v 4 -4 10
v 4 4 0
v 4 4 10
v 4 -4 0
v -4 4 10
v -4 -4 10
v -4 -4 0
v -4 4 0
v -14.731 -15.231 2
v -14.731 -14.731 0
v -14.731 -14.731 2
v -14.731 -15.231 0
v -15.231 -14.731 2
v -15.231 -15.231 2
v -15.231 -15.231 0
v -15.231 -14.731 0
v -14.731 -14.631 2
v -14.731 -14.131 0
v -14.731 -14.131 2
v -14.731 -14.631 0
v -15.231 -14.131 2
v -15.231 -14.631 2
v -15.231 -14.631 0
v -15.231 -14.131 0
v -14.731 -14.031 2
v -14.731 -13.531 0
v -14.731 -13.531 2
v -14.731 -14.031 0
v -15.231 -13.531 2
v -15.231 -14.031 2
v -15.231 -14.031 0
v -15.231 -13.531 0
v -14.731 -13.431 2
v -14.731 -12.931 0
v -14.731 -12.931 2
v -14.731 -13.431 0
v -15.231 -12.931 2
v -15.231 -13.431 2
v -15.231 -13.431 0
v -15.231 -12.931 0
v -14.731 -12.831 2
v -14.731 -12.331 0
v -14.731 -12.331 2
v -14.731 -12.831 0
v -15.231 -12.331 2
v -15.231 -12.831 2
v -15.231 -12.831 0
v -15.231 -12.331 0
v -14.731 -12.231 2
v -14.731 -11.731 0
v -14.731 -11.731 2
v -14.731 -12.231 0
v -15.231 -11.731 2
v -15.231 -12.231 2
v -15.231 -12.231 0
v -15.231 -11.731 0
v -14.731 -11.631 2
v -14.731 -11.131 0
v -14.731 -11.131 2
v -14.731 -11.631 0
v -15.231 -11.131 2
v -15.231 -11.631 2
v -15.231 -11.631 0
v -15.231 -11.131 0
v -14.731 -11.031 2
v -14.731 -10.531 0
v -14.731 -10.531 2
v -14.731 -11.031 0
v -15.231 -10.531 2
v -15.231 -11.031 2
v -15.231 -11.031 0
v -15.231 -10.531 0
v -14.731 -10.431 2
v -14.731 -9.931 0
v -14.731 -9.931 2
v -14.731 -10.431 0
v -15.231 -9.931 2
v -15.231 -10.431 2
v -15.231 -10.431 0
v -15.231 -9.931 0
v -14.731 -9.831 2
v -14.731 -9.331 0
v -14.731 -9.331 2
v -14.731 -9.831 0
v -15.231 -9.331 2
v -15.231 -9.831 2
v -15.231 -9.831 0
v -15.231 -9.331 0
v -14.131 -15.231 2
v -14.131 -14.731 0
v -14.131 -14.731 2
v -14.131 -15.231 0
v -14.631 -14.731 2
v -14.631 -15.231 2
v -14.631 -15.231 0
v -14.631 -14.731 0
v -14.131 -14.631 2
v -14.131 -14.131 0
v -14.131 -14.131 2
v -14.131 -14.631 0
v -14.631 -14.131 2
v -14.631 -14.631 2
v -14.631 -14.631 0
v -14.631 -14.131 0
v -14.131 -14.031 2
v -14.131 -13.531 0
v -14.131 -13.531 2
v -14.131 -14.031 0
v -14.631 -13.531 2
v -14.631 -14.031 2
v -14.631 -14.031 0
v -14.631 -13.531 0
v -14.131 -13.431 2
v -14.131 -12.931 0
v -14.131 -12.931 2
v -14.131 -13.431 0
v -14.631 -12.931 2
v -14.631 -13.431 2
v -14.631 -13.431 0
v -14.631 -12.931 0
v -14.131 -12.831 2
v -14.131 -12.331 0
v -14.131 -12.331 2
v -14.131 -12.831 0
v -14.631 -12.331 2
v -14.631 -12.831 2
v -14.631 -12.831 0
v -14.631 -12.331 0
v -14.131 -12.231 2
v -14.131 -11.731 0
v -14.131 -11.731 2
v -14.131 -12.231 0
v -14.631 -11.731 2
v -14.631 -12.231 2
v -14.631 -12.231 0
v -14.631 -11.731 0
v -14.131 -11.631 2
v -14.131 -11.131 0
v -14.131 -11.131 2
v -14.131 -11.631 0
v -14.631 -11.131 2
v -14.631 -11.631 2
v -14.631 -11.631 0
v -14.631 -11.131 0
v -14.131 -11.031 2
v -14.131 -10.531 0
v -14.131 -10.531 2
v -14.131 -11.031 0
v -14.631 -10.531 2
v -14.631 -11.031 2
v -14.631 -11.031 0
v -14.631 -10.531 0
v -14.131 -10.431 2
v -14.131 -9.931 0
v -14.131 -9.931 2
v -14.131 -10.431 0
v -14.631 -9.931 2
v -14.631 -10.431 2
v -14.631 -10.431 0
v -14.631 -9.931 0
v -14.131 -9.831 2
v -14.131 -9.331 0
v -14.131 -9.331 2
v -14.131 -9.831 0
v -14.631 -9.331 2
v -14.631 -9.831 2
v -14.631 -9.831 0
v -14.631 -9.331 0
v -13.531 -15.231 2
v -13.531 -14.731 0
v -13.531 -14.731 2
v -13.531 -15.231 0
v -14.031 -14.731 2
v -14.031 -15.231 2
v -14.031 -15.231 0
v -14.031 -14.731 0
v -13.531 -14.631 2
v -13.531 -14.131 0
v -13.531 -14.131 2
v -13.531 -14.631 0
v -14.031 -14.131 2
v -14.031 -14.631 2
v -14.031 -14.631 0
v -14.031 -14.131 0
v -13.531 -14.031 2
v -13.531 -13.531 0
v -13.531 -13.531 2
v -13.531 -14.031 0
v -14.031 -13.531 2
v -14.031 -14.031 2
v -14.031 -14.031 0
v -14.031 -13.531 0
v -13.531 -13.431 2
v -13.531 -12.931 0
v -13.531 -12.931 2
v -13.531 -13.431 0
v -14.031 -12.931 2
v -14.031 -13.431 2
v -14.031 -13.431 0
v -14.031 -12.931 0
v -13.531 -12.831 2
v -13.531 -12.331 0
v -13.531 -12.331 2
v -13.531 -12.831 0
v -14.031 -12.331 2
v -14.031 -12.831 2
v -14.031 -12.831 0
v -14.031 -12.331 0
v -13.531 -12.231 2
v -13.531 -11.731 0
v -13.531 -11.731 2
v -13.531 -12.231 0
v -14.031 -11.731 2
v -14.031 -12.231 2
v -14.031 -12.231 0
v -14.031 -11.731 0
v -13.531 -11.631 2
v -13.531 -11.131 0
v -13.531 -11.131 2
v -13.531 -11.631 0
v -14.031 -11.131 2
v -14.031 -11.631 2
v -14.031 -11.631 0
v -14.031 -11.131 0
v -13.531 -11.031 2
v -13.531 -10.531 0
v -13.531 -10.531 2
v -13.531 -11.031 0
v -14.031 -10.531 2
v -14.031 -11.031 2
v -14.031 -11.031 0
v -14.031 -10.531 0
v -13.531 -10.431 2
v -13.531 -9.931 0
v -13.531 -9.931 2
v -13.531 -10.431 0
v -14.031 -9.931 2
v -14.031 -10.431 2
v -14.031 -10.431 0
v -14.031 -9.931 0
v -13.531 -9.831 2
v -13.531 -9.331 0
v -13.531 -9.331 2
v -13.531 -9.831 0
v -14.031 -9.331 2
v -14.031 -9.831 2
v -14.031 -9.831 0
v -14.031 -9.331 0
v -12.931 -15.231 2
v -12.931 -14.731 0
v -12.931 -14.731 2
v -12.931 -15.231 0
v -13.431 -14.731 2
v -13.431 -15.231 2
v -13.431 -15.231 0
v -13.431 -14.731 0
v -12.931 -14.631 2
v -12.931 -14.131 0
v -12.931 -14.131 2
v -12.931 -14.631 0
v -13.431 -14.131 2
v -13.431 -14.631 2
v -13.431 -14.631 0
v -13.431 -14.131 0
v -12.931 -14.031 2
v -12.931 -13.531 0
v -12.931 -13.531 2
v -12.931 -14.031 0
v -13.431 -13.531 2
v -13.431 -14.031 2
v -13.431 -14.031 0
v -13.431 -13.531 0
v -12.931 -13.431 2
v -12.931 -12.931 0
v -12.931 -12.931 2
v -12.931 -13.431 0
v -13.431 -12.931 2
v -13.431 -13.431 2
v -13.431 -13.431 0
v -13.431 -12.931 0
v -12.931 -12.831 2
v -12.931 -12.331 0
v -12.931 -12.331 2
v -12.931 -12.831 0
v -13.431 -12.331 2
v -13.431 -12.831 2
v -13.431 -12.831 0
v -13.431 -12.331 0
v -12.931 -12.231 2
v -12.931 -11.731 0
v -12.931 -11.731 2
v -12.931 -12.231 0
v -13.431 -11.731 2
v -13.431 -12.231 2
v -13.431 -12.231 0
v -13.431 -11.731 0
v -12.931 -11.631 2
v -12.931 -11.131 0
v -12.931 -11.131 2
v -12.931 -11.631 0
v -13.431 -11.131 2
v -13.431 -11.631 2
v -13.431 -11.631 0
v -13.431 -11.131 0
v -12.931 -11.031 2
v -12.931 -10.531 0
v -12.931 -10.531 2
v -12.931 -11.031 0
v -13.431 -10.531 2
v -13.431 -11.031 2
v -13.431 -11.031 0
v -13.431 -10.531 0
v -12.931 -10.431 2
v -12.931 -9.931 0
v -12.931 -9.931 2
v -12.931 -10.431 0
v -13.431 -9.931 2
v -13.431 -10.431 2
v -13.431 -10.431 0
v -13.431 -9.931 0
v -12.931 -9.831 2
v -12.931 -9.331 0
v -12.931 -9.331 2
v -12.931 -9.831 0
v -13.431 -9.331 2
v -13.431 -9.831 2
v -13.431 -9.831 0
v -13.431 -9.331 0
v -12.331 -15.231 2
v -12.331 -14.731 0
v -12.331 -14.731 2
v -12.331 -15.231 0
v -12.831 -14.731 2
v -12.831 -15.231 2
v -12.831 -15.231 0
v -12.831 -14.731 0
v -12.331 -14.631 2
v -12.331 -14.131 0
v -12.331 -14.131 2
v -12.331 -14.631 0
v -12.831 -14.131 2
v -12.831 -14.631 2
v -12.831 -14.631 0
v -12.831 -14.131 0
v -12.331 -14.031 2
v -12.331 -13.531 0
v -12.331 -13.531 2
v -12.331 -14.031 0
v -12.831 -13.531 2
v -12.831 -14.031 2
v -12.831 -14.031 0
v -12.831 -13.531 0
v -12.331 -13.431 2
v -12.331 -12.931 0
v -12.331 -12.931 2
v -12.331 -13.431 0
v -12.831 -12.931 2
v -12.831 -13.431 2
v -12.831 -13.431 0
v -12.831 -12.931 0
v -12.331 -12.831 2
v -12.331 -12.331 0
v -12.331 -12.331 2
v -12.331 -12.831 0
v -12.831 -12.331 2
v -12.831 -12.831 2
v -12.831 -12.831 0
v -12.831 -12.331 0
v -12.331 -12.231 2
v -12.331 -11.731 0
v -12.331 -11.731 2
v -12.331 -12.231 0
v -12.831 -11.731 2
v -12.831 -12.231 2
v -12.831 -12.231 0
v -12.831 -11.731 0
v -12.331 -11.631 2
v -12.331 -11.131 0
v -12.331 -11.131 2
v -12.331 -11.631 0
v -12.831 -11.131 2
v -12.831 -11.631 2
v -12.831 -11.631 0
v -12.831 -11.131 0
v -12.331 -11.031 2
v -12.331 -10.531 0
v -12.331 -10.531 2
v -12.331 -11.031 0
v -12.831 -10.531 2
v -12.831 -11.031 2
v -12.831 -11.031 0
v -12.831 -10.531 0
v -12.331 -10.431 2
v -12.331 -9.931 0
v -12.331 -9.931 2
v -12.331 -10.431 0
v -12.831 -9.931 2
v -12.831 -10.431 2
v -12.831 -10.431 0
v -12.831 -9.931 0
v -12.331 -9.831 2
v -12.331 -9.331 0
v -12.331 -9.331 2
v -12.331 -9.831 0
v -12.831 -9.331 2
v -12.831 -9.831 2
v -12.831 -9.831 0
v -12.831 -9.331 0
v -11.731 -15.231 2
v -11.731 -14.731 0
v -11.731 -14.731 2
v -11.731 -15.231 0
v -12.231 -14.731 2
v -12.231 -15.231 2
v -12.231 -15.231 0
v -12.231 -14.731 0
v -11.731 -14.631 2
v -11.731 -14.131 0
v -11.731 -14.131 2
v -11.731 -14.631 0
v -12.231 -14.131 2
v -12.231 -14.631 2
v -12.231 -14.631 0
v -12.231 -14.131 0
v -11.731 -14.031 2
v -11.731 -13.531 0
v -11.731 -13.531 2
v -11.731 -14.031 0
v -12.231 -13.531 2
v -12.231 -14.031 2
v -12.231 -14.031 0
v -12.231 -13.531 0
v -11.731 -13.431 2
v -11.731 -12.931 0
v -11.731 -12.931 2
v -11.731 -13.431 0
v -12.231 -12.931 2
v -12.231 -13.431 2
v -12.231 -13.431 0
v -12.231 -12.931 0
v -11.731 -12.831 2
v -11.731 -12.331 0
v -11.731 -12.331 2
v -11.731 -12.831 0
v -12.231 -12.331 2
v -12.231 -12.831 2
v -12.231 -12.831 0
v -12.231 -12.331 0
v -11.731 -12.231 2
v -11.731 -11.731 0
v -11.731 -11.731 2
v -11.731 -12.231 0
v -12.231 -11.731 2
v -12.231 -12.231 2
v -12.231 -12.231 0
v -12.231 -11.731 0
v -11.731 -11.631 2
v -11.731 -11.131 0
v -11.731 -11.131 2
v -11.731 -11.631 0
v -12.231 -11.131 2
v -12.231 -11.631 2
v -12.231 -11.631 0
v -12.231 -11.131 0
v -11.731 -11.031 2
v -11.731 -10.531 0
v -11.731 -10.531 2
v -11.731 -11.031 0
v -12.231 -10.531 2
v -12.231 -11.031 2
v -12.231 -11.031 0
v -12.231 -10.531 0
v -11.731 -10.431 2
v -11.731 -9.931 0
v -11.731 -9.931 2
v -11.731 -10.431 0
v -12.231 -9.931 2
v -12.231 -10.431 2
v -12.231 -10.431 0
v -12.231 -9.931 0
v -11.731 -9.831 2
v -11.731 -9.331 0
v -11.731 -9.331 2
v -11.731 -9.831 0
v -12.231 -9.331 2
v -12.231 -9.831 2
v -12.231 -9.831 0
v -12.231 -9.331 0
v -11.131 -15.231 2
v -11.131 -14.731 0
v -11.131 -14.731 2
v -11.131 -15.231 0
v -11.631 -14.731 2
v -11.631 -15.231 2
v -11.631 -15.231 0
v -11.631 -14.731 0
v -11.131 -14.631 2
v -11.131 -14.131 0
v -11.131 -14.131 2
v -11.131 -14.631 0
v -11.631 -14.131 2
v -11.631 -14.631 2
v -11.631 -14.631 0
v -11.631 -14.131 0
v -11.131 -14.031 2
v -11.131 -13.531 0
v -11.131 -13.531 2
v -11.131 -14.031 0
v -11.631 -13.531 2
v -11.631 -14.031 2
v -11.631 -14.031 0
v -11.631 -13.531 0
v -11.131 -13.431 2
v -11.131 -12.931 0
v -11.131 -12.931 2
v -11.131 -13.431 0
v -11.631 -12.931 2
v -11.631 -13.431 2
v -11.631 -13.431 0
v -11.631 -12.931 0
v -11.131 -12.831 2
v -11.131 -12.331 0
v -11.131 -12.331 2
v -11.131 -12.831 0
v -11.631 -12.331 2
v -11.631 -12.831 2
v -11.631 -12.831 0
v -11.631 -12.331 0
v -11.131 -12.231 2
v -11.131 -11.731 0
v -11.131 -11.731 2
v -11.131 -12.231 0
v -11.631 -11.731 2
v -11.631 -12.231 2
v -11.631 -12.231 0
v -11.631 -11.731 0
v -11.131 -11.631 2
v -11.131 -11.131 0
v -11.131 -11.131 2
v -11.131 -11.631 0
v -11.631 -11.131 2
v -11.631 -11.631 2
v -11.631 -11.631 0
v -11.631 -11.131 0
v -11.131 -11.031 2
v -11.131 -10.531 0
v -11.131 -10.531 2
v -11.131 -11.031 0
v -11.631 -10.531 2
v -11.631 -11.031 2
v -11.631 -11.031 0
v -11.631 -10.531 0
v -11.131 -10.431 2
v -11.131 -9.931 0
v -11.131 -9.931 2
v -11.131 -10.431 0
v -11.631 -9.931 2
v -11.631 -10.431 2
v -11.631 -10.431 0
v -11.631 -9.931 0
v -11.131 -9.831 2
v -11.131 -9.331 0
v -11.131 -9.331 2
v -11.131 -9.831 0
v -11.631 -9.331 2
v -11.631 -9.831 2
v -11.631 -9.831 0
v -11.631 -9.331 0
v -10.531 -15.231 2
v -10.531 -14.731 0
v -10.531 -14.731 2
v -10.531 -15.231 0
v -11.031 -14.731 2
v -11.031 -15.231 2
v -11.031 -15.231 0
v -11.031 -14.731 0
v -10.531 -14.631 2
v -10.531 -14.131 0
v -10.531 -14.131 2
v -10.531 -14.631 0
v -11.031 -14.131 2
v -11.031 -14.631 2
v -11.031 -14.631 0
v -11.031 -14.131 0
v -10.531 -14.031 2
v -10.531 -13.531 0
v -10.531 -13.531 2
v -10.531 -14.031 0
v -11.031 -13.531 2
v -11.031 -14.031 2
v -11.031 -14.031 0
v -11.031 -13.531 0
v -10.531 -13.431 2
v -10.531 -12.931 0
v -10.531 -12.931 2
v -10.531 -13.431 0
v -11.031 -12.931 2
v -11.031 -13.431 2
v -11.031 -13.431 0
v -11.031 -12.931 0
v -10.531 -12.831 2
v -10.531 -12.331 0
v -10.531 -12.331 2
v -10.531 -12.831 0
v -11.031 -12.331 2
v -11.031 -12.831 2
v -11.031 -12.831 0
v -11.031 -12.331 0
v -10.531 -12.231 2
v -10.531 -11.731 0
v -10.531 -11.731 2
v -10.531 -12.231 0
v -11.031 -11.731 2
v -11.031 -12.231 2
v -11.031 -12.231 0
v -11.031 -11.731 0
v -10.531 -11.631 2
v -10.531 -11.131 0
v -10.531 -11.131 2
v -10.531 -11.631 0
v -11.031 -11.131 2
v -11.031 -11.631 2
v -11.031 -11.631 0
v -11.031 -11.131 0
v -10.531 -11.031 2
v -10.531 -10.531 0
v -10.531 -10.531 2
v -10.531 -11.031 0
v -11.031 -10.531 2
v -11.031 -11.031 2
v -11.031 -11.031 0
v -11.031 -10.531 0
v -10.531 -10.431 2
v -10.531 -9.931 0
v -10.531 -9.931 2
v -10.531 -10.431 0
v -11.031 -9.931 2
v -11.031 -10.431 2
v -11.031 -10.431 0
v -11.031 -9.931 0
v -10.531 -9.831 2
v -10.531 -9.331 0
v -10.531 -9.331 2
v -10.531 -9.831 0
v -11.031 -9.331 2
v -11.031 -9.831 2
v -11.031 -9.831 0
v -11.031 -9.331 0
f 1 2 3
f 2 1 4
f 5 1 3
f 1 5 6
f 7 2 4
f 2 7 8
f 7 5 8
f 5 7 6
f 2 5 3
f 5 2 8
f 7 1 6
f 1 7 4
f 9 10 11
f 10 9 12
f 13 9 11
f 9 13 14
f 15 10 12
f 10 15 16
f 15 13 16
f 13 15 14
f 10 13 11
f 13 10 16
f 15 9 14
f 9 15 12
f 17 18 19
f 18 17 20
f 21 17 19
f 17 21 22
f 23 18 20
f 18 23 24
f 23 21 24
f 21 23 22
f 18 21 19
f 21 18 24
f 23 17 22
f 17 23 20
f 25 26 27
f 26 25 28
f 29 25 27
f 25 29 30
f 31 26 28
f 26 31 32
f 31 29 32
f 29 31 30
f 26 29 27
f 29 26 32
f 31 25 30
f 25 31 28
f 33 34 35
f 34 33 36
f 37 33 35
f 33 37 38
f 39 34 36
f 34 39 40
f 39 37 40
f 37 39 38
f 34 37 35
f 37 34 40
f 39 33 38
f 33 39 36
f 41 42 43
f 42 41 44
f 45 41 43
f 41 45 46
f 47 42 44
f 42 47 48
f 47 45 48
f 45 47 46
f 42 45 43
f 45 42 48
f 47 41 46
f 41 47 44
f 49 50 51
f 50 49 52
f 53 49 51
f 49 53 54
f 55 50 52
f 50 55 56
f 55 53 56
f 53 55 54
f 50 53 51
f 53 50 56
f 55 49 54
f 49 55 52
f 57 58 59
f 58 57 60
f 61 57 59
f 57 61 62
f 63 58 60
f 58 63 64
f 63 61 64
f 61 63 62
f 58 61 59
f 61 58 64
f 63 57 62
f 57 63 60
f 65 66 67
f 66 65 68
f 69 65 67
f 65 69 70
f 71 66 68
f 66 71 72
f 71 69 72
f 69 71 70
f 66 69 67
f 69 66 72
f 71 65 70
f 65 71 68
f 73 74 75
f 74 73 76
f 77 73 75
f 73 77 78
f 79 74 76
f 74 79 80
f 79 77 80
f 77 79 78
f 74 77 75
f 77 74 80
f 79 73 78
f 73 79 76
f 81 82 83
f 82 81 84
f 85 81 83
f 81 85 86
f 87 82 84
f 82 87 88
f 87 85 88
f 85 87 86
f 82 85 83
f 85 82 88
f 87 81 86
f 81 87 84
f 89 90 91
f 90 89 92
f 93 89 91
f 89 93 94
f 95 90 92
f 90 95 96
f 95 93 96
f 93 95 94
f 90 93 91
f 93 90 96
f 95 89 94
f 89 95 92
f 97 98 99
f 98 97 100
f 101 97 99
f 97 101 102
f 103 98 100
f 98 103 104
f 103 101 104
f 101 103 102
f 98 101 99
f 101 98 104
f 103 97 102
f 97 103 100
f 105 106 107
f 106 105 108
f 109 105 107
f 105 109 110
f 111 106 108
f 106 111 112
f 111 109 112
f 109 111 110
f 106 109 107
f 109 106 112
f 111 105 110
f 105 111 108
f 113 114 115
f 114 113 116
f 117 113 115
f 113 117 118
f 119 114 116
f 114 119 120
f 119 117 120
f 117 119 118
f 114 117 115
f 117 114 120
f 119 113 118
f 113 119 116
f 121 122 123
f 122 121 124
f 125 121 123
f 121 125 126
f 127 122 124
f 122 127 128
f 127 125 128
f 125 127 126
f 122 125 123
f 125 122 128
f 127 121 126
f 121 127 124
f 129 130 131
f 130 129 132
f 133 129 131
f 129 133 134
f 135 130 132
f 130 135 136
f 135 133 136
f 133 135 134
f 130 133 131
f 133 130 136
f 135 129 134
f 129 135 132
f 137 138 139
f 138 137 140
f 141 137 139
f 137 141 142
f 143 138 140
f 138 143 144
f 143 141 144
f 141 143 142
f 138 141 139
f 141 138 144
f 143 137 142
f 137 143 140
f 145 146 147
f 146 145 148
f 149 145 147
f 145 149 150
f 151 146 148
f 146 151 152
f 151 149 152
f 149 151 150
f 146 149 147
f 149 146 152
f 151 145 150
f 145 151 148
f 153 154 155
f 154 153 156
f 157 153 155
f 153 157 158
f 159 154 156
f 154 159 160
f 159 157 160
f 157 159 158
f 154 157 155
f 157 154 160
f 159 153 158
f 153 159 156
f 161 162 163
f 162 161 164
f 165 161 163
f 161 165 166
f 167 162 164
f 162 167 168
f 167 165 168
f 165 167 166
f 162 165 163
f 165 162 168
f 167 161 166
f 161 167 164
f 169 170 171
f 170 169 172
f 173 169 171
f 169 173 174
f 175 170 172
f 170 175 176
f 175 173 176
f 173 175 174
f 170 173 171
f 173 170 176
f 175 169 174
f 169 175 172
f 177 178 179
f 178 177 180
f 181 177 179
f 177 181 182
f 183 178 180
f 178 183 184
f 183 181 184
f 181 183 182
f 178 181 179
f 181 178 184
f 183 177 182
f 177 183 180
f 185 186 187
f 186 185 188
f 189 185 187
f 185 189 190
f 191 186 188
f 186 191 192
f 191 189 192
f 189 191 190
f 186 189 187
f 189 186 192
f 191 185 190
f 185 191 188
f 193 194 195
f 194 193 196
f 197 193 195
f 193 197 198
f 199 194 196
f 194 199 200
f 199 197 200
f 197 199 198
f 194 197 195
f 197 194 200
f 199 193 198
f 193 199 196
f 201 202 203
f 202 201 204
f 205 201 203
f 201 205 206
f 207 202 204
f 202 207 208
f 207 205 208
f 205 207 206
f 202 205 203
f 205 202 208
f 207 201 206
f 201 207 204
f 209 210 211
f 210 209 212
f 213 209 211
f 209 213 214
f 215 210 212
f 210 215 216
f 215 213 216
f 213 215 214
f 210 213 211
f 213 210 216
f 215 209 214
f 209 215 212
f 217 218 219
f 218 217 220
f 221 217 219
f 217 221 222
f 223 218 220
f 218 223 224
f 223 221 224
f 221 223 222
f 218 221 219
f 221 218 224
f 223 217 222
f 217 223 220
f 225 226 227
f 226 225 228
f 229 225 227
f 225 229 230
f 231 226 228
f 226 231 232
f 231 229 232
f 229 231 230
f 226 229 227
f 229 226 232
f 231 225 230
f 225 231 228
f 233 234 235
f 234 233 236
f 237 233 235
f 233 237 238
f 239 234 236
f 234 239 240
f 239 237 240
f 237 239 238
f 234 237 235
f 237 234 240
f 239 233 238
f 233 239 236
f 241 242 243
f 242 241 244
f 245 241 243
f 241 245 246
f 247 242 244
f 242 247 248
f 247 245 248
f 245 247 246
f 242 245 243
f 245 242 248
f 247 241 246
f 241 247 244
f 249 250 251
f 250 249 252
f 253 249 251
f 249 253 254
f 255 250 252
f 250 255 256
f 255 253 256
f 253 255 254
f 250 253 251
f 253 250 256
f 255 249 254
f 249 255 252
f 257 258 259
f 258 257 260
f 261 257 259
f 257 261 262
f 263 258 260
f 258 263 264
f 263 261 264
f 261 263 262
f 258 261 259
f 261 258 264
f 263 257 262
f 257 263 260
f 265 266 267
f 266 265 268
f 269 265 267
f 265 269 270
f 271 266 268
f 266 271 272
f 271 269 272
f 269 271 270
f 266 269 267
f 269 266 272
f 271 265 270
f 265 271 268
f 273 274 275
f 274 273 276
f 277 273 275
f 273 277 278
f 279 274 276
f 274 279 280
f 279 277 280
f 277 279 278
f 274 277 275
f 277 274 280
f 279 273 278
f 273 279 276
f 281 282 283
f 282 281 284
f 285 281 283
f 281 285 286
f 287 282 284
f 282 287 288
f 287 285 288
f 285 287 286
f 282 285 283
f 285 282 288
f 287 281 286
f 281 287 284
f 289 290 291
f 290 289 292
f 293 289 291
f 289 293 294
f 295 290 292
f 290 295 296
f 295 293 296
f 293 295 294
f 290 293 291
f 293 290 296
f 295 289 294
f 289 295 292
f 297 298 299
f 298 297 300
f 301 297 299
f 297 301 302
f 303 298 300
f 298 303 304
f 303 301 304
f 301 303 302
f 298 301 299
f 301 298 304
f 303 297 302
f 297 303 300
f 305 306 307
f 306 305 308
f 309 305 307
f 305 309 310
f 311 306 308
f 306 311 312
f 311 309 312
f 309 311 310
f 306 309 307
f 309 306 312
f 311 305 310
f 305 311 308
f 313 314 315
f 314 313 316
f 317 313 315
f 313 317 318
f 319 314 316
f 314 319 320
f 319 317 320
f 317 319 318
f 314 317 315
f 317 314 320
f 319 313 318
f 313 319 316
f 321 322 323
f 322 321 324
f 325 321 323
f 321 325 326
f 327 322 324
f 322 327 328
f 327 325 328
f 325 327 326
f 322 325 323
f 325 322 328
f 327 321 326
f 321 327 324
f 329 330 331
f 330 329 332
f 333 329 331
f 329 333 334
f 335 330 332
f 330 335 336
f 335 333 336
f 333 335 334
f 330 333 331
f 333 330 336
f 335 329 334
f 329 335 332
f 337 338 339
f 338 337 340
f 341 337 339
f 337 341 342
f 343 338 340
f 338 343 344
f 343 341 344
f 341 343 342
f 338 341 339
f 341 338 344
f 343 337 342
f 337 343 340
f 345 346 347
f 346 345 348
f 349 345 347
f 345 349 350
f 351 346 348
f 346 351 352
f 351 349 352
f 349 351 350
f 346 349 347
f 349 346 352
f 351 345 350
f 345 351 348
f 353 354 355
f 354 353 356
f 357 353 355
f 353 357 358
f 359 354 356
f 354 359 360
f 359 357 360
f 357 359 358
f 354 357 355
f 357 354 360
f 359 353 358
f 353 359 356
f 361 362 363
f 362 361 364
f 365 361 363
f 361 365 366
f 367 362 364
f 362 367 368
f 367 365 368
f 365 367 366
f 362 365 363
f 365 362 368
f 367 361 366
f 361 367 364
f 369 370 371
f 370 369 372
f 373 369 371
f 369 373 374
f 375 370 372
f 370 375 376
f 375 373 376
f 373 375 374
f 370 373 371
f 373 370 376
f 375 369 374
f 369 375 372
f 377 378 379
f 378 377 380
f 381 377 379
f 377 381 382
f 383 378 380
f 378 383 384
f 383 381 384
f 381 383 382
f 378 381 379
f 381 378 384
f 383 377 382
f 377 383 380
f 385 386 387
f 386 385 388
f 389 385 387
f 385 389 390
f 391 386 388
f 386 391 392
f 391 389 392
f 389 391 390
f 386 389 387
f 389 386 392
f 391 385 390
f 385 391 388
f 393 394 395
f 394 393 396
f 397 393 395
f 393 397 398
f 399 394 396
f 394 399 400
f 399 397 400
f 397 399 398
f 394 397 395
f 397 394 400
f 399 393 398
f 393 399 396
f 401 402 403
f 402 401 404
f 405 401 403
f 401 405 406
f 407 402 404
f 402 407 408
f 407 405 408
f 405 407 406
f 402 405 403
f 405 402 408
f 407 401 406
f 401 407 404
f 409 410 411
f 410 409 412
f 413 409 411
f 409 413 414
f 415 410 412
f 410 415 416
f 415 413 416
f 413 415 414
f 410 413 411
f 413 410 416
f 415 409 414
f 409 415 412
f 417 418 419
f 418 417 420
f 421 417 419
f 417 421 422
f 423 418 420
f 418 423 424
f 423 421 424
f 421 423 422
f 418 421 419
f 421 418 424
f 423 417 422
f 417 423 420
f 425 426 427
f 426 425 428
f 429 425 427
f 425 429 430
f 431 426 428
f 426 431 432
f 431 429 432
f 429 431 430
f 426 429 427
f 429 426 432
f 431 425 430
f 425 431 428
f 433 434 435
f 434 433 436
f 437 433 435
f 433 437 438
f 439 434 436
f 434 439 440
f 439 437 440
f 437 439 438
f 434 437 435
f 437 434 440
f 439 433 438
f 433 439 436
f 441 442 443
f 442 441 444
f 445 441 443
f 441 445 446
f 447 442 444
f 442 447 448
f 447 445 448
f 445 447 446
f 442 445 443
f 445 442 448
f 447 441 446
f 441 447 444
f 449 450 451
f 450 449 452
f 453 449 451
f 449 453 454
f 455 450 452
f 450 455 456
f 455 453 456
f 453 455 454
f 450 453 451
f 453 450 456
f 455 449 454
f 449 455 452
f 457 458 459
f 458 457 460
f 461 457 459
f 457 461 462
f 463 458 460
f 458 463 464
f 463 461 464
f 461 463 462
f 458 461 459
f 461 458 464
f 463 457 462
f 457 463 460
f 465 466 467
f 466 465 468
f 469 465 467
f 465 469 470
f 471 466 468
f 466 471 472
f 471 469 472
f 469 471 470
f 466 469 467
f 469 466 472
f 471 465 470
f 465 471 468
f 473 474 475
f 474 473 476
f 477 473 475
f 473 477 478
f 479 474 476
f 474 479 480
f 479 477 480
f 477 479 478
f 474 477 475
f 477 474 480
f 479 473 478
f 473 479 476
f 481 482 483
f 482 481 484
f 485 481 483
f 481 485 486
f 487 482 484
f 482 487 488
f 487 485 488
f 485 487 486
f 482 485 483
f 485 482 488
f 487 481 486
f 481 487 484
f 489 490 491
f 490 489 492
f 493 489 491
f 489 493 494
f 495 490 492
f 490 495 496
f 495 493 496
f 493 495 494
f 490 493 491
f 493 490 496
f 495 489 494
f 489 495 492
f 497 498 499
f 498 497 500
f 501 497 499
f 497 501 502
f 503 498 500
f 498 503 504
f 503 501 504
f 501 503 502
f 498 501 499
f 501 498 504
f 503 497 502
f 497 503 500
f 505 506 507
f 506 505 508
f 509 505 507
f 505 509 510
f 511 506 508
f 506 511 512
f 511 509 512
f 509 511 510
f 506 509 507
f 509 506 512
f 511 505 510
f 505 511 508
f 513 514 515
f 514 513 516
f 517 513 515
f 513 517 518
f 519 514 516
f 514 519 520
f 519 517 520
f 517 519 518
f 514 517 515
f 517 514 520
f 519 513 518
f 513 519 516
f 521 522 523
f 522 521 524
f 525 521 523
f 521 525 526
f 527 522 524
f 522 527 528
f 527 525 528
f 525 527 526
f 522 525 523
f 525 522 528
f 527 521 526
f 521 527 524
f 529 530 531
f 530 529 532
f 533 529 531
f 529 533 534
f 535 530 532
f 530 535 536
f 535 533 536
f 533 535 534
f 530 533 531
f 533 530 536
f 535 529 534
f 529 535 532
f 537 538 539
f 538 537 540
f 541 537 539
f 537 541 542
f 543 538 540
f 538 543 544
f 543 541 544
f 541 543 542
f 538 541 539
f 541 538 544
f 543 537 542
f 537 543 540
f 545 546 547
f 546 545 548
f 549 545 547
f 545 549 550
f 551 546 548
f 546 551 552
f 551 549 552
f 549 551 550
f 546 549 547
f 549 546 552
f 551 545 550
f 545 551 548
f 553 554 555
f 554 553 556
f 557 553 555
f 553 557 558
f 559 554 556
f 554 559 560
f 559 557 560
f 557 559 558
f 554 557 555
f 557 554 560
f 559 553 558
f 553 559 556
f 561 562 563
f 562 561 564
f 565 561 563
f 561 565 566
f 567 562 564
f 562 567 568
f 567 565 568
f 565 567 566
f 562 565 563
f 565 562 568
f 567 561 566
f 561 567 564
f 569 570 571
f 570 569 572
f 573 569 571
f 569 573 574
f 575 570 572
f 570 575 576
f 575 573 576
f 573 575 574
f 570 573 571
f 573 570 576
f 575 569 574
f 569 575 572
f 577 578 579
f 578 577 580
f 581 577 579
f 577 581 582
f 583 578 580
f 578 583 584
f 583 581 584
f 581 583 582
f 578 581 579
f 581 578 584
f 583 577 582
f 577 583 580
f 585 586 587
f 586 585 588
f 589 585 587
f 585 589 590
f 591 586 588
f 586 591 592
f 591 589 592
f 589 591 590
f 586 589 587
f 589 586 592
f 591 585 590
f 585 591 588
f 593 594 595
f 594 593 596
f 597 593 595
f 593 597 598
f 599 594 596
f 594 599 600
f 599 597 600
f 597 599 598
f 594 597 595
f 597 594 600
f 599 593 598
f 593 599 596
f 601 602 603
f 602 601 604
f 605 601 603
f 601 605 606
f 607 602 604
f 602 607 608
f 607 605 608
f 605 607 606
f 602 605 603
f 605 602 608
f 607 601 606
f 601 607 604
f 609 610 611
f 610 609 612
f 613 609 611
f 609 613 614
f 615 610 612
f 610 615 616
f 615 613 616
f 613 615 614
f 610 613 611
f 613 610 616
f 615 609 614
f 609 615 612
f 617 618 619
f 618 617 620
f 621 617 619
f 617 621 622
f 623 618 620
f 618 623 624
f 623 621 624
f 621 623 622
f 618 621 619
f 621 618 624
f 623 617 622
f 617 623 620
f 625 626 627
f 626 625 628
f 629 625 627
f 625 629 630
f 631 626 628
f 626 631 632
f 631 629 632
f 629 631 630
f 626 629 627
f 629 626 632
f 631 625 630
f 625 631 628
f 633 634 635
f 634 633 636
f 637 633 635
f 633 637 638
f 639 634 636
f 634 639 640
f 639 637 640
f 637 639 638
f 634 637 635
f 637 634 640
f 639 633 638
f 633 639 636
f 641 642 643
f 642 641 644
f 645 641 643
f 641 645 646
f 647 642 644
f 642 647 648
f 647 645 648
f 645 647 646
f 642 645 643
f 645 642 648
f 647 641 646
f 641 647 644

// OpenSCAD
translate([0, 0, 5]) color([0,1,0,0.9]) cube([8, 8, 10], center=true);
translate([-14.98142396999972, -14.98142396999972, 1]) color([1,0,0]) cube([0.5, 0.5, 2], center=true);
translate([-14.98142396999972, -14.38142396999972, 1]) color([1,0,0]) cube([0.5, 0.5, 2], center=true);
translate([-14.98142396999972, -13.78142396999972, 1]) color([1,0,0]) cube([0.5, 0.5, 2], center=true);
translate([-14.98142396999972, -13.18142396999972, 1]) color([1,0,0]) cube([0.5, 0.5, 2], center=true);
translate([-14.98142396999972, -12.581423969999719, 1]) color([1,0,0]) cube([0.5, 0.5, 2], center=true);
translate([-14.98142396999972, -11.98142396999972, 1]) color([1,0,0]) cube([0.5, 0.5, 2], center=true);
translate([-14.98142396999972, -11.38142396999972, 1]) color([1,0,0]) cube([0.5, 0.5, 2], center=true);
translate([-14.98142396999972, -10.781423969999718, 1]) color([1,0,0]) cube([0.5, 0.5, 2], center=true);
translate([-14.98142396999972, -10.181423969999718, 1]) color([1,0,0]) cube([0.5, 0.5, 2], center=true);
translate([-14.98142396999972, -9.581423969999719, 1]) color([1,0,0]) cube([0.5, 0.5, 2], center=true);
translate([-14.38142396999972, -14.98142396999972, 1]) color([1,0,0]) cube([0.5, 0.5, 2], center=true);
translate([-14.38142396999972, -14.38142396999972, 1]) color([1,0,0]) cube([0.5, 0.5, 2], center=true);
translate([-14.38142396999972, -13.78142396999972, 1]) color([1,0,0]) cube([0.5, 0.5, 2], center=true);
translate([-14.38142396999972, -13.18142396999972, 1]) color([1,0,0]) cube([0.5, 0.5, 2], center=true);
translate([-14.38142396999972, -12.581423969999719, 1]) color([1,0,0]) cube([0.5, 0.5, 2], center=true);
translate([-14.38142396999972, -11.98142396999972, 1]) color([1,0,0]) cube([0.5, 0.5, 2], center=true);
translate([-14.38142396999972, -11.38142396999972, 1]) color([1,0,0]) cube([0.5, 0.5, 2], center=true);
translate([-14.38142396999972, -10.781423969999718, 1]) color([1,0,0]) cube([0.5, 0.5, 2], center=true);
translate([-14.38142396999972, -10.181423969999718, 1]) color([1,0,0]) cube([0.5, 0.5, 2], center=true);
translate([-14.38142396999972, -9.581423969999719, 1]) color([1,0,0]) cube([0.5, 0.5, 2], center=true);
translate([-13.78142396999972, -14.98142396999972, 1]) color([1,0,0]) cube([0.5, 0.5, 2], center=true);
translate([-13.78142396999972, -14.38142396999972, 1]) color([1,0,0]) cube([0.5, 0.5, 2], center=true);
translate([-13.78142396999972, -13.78142396999972, 1]) color([1,0,0]) cube([0.5, 0.5, 2], center=true);
translate([-13.78142396999972, -13.18142396999972, 1]) color([1,0,0]) cube([0.5, 0.5, 2], center=true);
translate([-13.78142396999972, -12.581423969999719, 1]) color([1,0,0]) cube([0.5, 0.5, 2], center=true);
translate([-13.78142396999972, -11.98142396999972, 1]) color([1,0,0]) cube([0.5, 0.5, 2], center=true);
translate([-13.78142396999972, -11.38142396999972, 1]) color([1,0,0]) cube([0.5, 0.5, 2], center=true);
translate([-13.78142396999972, -10.781423969999718, 1]) color([1,0,0]) cube([0.5, 0.5, 2], center=true);
translate([-13.78142396999972, -10.181423969999718, 1]) color([1,0,0]) cube([0.5, 0.5, 2], center=true);
translate([-13.78142396999972, -9.581423969999719, 1]) color([1,0,0]) cube([0.5, 0.5, 2], center=true);
translate([-13.18142396999972, -14.98142396999972, 1]) color([1,0,0]) cube([0.5, 0.5, 2], center=true);
translate([-13.18142396999972, -14.38142396999972, 1]) color([1,0,0]) cube([0.5, 0.5, 2], center=true);
translate([-13.18142396999972, -13.78142396999972, 1]) color([1,0,0]) cube([0.5, 0.5, 2], center=true);
translate([-13.18142396999972, -13.18142396999972, 1]) color([1,0,0]) cube([0.5, 0.5, 2], center=true);
translate([-13.18142396999972, -12.581423969999719, 1]) color([1,0,0]) cube([0.5, 0.5, 2], center=true);
translate([-13.18142396999972, -11.98142396999972, 1]) color([1,0,0]) cube([0.5, 0.5, 2], center=true);
translate([-13.18142396999972, -11.38142396999972, 1]) color([1,0,0]) cube([0.5, 0.5, 2], center=true);
translate([-13.18142396999972, -10.781423969999718, 1]) color([1,0,0]) cube([0.5, 0.5, 2], center=true);
translate([-13.18142396999972, -10.181423969999718, 1]) color([1,0,0]) cube([0.5, 0.5, 2], center=true);
translate([-13.18142396999972, -9.581423969999719, 1]) color([1,0,0]) cube([0.5, 0.5, 2], center=true);
translate([-12.581423969999719, -14.98142396999972, 1]) color([1,0,0]) cube([0.5, 0.5, 2], center=true);
translate([-12.581423969999719, -14.38142396999972, 1]) color([1,0,0]) cube([0.5, 0.5, 2], center=true);
translate([-12.581423969999719, -13.78142396999972, 1]) color([1,0,0]) cube([0.5, 0.5, 2], center=true);
translate([-12.581423969999719, -13.18142396999972, 1]) color([1,0,0]) cube([0.5, 0.5, 2], center=true);
translate([-12.581423969999719, -12.581423969999719, 1]) color([1,0,0]) cube([0.5, 0.5, 2], center=true);
translate([-12.581423969999719, -11.98142396999972, 1]) color([1,0,0]) cube([0.5, 0.5, 2], center=true);
translate([-12.581423969999719, -11.38142396999972, 1]) color([1,0,0]) cube([0.5, 0.5, 2], center=true);
translate([-12.581423969999719, -10.781423969999718, 1]) color([1,0,0]) cube([0.5, 0.5, 2], center=true);
translate([-12.581423969999719, -10.181423969999718, 1]) color([1,0,0]) cube([0.5, 0.5, 2], center=true);
translate([-12.581423969999719, -9.581423969999719, 1]) color([1,0,0]) cube([0.5, 0.5, 2], center=true);
translate([-11.98142396999972, -14.98142396999972, 1]) color([1,0,0]) cube([0.5, 0.5, 2], center=true);
translate([-11.98142396999972, -14.38142396999972, 1]) color([1,0,0]) cube([0.5, 0.5, 2], center=true);
translate([-11.98142396999972, -13.78142396999972, 1]) color([1,0,0]) cube([0.5, 0.5, 2], center=true);
translate([-11.98142396999972, -13.18142396999972, 1]) color([1,0,0]) cube([0.5, 0.5, 2], center=true);
translate([-11.98142396999972, -12.581423969999719, 1]) color([1,0,0]) cube([0.5, 0.5, 2], center=true);
translate([-11.98142396999972, -11.98142396999972, 1]) color([1,0,0]) cube([0.5, 0.5, 2], center=true);
translate([-11.98142396999972, -11.38142396999972, 1]) color([1,0,0]) cube([0.5, 0.5, 2], center=true);
translate([-11.98142396999972, -10.781423969999718, 1]) color([1,0,0]) cube([0.5, 0.5, 2], center=true);
translate([-11.98142396999972, -10.181423969999718, 1]) color([1,0,0]) cube([0.5, 0.5, 2], center=true);
translate([-11.98142396999972, -9.581423969999719, 1]) color([1,0,0]) cube([0.5, 0.5, 2], center=true);
translate([-11.38142396999972, -14.98142396999972, 1]) color([1,0,0]) cube([0.5, 0.5, 2], center=true);
translate([-11.38142396999972, -14.38142396999972, 1]) color([1,0,0]) cube([0.5, 0.5, 2], center=true);
translate([-11.38142396999972, -13.78142396999972, 1]) color([1,0,0]) cube([0.5, 0.5, 2], center=true);
translate([-11.38142396999972, -13.18142396999972, 1]) color([1,0,0]) cube([0.5, 0.5, 2], center=true);
translate([-11.38142396999972, -12.581423969999719, 1]) color([1,0,0]) cube([0.5, 0.5, 2], center=true);
translate([-11.38142396999972, -11.98142396999972, 1]) color([1,0,0]) cube([0.5, 0.5, 2], center=true);
translate([-11.38142396999972, -11.38142396999972, 1]) color([1,0,0]) cube([0.5, 0.5, 2], center=true);
translate([-11.38142396999972, -10.781423969999718, 1]) color([1,0,0]) cube([0.5, 0.5, 2], center=true);
translate([-11.38142396999972, -10.181423969999718, 1]) color([1,0,0]) cube([0.5, 0.5, 2], center=true);
translate([-11.38142396999972, -9.581423969999719, 1]) color([1,0,0]) cube([0.5, 0.5, 2], center=true);
translate([-10.781423969999718, -14.98142396999972, 1]) color([1,0,0]) cube([0.5, 0.5, 2], center=true);
translate([-10.781423969999718, -14.38142396999972, 1]) color([1,0,0]) cube([0.5, 0.5, 2], center=true);
translate([-10.781423969999718, -13.78142396999972, 1]) color([1,0,0]) cube([0.5, 0.5, 2], center=true);
translate([-10.781423969999718, -13.18142396999972, 1]) color([1,0,0]) cube([0.5, 0.5, 2], center=true);
translate([-10.781423969999718, -12.581423969999719, 1]) color([1,0,0]) cube([0.5, 0.5, 2], center=true);
translate([-10.781423969999718, -11.98142396999972, 1]) color([1,0,0]) cube([0.5, 0.5, 2], center=true);
translate([-10.781423969999718, -11.38142396999972, 1]) color([1,0,0]) cube([0.5, 0.5, 2], center=true);
translate([-10.781423969999718, -10.781423969999718, 1]) color([1,0,0]) cube([0.5, 0.5, 2], center=true);
translate([-10.781423969999718, -10.181423969999718, 1]) color([1,0,0]) cube([0.5, 0.5, 2], center=true);
translate([-10.781423969999718, -9.581423969999719, 1]) color([1,0,0]) cube([0.5, 0.5, 2], center=true);
